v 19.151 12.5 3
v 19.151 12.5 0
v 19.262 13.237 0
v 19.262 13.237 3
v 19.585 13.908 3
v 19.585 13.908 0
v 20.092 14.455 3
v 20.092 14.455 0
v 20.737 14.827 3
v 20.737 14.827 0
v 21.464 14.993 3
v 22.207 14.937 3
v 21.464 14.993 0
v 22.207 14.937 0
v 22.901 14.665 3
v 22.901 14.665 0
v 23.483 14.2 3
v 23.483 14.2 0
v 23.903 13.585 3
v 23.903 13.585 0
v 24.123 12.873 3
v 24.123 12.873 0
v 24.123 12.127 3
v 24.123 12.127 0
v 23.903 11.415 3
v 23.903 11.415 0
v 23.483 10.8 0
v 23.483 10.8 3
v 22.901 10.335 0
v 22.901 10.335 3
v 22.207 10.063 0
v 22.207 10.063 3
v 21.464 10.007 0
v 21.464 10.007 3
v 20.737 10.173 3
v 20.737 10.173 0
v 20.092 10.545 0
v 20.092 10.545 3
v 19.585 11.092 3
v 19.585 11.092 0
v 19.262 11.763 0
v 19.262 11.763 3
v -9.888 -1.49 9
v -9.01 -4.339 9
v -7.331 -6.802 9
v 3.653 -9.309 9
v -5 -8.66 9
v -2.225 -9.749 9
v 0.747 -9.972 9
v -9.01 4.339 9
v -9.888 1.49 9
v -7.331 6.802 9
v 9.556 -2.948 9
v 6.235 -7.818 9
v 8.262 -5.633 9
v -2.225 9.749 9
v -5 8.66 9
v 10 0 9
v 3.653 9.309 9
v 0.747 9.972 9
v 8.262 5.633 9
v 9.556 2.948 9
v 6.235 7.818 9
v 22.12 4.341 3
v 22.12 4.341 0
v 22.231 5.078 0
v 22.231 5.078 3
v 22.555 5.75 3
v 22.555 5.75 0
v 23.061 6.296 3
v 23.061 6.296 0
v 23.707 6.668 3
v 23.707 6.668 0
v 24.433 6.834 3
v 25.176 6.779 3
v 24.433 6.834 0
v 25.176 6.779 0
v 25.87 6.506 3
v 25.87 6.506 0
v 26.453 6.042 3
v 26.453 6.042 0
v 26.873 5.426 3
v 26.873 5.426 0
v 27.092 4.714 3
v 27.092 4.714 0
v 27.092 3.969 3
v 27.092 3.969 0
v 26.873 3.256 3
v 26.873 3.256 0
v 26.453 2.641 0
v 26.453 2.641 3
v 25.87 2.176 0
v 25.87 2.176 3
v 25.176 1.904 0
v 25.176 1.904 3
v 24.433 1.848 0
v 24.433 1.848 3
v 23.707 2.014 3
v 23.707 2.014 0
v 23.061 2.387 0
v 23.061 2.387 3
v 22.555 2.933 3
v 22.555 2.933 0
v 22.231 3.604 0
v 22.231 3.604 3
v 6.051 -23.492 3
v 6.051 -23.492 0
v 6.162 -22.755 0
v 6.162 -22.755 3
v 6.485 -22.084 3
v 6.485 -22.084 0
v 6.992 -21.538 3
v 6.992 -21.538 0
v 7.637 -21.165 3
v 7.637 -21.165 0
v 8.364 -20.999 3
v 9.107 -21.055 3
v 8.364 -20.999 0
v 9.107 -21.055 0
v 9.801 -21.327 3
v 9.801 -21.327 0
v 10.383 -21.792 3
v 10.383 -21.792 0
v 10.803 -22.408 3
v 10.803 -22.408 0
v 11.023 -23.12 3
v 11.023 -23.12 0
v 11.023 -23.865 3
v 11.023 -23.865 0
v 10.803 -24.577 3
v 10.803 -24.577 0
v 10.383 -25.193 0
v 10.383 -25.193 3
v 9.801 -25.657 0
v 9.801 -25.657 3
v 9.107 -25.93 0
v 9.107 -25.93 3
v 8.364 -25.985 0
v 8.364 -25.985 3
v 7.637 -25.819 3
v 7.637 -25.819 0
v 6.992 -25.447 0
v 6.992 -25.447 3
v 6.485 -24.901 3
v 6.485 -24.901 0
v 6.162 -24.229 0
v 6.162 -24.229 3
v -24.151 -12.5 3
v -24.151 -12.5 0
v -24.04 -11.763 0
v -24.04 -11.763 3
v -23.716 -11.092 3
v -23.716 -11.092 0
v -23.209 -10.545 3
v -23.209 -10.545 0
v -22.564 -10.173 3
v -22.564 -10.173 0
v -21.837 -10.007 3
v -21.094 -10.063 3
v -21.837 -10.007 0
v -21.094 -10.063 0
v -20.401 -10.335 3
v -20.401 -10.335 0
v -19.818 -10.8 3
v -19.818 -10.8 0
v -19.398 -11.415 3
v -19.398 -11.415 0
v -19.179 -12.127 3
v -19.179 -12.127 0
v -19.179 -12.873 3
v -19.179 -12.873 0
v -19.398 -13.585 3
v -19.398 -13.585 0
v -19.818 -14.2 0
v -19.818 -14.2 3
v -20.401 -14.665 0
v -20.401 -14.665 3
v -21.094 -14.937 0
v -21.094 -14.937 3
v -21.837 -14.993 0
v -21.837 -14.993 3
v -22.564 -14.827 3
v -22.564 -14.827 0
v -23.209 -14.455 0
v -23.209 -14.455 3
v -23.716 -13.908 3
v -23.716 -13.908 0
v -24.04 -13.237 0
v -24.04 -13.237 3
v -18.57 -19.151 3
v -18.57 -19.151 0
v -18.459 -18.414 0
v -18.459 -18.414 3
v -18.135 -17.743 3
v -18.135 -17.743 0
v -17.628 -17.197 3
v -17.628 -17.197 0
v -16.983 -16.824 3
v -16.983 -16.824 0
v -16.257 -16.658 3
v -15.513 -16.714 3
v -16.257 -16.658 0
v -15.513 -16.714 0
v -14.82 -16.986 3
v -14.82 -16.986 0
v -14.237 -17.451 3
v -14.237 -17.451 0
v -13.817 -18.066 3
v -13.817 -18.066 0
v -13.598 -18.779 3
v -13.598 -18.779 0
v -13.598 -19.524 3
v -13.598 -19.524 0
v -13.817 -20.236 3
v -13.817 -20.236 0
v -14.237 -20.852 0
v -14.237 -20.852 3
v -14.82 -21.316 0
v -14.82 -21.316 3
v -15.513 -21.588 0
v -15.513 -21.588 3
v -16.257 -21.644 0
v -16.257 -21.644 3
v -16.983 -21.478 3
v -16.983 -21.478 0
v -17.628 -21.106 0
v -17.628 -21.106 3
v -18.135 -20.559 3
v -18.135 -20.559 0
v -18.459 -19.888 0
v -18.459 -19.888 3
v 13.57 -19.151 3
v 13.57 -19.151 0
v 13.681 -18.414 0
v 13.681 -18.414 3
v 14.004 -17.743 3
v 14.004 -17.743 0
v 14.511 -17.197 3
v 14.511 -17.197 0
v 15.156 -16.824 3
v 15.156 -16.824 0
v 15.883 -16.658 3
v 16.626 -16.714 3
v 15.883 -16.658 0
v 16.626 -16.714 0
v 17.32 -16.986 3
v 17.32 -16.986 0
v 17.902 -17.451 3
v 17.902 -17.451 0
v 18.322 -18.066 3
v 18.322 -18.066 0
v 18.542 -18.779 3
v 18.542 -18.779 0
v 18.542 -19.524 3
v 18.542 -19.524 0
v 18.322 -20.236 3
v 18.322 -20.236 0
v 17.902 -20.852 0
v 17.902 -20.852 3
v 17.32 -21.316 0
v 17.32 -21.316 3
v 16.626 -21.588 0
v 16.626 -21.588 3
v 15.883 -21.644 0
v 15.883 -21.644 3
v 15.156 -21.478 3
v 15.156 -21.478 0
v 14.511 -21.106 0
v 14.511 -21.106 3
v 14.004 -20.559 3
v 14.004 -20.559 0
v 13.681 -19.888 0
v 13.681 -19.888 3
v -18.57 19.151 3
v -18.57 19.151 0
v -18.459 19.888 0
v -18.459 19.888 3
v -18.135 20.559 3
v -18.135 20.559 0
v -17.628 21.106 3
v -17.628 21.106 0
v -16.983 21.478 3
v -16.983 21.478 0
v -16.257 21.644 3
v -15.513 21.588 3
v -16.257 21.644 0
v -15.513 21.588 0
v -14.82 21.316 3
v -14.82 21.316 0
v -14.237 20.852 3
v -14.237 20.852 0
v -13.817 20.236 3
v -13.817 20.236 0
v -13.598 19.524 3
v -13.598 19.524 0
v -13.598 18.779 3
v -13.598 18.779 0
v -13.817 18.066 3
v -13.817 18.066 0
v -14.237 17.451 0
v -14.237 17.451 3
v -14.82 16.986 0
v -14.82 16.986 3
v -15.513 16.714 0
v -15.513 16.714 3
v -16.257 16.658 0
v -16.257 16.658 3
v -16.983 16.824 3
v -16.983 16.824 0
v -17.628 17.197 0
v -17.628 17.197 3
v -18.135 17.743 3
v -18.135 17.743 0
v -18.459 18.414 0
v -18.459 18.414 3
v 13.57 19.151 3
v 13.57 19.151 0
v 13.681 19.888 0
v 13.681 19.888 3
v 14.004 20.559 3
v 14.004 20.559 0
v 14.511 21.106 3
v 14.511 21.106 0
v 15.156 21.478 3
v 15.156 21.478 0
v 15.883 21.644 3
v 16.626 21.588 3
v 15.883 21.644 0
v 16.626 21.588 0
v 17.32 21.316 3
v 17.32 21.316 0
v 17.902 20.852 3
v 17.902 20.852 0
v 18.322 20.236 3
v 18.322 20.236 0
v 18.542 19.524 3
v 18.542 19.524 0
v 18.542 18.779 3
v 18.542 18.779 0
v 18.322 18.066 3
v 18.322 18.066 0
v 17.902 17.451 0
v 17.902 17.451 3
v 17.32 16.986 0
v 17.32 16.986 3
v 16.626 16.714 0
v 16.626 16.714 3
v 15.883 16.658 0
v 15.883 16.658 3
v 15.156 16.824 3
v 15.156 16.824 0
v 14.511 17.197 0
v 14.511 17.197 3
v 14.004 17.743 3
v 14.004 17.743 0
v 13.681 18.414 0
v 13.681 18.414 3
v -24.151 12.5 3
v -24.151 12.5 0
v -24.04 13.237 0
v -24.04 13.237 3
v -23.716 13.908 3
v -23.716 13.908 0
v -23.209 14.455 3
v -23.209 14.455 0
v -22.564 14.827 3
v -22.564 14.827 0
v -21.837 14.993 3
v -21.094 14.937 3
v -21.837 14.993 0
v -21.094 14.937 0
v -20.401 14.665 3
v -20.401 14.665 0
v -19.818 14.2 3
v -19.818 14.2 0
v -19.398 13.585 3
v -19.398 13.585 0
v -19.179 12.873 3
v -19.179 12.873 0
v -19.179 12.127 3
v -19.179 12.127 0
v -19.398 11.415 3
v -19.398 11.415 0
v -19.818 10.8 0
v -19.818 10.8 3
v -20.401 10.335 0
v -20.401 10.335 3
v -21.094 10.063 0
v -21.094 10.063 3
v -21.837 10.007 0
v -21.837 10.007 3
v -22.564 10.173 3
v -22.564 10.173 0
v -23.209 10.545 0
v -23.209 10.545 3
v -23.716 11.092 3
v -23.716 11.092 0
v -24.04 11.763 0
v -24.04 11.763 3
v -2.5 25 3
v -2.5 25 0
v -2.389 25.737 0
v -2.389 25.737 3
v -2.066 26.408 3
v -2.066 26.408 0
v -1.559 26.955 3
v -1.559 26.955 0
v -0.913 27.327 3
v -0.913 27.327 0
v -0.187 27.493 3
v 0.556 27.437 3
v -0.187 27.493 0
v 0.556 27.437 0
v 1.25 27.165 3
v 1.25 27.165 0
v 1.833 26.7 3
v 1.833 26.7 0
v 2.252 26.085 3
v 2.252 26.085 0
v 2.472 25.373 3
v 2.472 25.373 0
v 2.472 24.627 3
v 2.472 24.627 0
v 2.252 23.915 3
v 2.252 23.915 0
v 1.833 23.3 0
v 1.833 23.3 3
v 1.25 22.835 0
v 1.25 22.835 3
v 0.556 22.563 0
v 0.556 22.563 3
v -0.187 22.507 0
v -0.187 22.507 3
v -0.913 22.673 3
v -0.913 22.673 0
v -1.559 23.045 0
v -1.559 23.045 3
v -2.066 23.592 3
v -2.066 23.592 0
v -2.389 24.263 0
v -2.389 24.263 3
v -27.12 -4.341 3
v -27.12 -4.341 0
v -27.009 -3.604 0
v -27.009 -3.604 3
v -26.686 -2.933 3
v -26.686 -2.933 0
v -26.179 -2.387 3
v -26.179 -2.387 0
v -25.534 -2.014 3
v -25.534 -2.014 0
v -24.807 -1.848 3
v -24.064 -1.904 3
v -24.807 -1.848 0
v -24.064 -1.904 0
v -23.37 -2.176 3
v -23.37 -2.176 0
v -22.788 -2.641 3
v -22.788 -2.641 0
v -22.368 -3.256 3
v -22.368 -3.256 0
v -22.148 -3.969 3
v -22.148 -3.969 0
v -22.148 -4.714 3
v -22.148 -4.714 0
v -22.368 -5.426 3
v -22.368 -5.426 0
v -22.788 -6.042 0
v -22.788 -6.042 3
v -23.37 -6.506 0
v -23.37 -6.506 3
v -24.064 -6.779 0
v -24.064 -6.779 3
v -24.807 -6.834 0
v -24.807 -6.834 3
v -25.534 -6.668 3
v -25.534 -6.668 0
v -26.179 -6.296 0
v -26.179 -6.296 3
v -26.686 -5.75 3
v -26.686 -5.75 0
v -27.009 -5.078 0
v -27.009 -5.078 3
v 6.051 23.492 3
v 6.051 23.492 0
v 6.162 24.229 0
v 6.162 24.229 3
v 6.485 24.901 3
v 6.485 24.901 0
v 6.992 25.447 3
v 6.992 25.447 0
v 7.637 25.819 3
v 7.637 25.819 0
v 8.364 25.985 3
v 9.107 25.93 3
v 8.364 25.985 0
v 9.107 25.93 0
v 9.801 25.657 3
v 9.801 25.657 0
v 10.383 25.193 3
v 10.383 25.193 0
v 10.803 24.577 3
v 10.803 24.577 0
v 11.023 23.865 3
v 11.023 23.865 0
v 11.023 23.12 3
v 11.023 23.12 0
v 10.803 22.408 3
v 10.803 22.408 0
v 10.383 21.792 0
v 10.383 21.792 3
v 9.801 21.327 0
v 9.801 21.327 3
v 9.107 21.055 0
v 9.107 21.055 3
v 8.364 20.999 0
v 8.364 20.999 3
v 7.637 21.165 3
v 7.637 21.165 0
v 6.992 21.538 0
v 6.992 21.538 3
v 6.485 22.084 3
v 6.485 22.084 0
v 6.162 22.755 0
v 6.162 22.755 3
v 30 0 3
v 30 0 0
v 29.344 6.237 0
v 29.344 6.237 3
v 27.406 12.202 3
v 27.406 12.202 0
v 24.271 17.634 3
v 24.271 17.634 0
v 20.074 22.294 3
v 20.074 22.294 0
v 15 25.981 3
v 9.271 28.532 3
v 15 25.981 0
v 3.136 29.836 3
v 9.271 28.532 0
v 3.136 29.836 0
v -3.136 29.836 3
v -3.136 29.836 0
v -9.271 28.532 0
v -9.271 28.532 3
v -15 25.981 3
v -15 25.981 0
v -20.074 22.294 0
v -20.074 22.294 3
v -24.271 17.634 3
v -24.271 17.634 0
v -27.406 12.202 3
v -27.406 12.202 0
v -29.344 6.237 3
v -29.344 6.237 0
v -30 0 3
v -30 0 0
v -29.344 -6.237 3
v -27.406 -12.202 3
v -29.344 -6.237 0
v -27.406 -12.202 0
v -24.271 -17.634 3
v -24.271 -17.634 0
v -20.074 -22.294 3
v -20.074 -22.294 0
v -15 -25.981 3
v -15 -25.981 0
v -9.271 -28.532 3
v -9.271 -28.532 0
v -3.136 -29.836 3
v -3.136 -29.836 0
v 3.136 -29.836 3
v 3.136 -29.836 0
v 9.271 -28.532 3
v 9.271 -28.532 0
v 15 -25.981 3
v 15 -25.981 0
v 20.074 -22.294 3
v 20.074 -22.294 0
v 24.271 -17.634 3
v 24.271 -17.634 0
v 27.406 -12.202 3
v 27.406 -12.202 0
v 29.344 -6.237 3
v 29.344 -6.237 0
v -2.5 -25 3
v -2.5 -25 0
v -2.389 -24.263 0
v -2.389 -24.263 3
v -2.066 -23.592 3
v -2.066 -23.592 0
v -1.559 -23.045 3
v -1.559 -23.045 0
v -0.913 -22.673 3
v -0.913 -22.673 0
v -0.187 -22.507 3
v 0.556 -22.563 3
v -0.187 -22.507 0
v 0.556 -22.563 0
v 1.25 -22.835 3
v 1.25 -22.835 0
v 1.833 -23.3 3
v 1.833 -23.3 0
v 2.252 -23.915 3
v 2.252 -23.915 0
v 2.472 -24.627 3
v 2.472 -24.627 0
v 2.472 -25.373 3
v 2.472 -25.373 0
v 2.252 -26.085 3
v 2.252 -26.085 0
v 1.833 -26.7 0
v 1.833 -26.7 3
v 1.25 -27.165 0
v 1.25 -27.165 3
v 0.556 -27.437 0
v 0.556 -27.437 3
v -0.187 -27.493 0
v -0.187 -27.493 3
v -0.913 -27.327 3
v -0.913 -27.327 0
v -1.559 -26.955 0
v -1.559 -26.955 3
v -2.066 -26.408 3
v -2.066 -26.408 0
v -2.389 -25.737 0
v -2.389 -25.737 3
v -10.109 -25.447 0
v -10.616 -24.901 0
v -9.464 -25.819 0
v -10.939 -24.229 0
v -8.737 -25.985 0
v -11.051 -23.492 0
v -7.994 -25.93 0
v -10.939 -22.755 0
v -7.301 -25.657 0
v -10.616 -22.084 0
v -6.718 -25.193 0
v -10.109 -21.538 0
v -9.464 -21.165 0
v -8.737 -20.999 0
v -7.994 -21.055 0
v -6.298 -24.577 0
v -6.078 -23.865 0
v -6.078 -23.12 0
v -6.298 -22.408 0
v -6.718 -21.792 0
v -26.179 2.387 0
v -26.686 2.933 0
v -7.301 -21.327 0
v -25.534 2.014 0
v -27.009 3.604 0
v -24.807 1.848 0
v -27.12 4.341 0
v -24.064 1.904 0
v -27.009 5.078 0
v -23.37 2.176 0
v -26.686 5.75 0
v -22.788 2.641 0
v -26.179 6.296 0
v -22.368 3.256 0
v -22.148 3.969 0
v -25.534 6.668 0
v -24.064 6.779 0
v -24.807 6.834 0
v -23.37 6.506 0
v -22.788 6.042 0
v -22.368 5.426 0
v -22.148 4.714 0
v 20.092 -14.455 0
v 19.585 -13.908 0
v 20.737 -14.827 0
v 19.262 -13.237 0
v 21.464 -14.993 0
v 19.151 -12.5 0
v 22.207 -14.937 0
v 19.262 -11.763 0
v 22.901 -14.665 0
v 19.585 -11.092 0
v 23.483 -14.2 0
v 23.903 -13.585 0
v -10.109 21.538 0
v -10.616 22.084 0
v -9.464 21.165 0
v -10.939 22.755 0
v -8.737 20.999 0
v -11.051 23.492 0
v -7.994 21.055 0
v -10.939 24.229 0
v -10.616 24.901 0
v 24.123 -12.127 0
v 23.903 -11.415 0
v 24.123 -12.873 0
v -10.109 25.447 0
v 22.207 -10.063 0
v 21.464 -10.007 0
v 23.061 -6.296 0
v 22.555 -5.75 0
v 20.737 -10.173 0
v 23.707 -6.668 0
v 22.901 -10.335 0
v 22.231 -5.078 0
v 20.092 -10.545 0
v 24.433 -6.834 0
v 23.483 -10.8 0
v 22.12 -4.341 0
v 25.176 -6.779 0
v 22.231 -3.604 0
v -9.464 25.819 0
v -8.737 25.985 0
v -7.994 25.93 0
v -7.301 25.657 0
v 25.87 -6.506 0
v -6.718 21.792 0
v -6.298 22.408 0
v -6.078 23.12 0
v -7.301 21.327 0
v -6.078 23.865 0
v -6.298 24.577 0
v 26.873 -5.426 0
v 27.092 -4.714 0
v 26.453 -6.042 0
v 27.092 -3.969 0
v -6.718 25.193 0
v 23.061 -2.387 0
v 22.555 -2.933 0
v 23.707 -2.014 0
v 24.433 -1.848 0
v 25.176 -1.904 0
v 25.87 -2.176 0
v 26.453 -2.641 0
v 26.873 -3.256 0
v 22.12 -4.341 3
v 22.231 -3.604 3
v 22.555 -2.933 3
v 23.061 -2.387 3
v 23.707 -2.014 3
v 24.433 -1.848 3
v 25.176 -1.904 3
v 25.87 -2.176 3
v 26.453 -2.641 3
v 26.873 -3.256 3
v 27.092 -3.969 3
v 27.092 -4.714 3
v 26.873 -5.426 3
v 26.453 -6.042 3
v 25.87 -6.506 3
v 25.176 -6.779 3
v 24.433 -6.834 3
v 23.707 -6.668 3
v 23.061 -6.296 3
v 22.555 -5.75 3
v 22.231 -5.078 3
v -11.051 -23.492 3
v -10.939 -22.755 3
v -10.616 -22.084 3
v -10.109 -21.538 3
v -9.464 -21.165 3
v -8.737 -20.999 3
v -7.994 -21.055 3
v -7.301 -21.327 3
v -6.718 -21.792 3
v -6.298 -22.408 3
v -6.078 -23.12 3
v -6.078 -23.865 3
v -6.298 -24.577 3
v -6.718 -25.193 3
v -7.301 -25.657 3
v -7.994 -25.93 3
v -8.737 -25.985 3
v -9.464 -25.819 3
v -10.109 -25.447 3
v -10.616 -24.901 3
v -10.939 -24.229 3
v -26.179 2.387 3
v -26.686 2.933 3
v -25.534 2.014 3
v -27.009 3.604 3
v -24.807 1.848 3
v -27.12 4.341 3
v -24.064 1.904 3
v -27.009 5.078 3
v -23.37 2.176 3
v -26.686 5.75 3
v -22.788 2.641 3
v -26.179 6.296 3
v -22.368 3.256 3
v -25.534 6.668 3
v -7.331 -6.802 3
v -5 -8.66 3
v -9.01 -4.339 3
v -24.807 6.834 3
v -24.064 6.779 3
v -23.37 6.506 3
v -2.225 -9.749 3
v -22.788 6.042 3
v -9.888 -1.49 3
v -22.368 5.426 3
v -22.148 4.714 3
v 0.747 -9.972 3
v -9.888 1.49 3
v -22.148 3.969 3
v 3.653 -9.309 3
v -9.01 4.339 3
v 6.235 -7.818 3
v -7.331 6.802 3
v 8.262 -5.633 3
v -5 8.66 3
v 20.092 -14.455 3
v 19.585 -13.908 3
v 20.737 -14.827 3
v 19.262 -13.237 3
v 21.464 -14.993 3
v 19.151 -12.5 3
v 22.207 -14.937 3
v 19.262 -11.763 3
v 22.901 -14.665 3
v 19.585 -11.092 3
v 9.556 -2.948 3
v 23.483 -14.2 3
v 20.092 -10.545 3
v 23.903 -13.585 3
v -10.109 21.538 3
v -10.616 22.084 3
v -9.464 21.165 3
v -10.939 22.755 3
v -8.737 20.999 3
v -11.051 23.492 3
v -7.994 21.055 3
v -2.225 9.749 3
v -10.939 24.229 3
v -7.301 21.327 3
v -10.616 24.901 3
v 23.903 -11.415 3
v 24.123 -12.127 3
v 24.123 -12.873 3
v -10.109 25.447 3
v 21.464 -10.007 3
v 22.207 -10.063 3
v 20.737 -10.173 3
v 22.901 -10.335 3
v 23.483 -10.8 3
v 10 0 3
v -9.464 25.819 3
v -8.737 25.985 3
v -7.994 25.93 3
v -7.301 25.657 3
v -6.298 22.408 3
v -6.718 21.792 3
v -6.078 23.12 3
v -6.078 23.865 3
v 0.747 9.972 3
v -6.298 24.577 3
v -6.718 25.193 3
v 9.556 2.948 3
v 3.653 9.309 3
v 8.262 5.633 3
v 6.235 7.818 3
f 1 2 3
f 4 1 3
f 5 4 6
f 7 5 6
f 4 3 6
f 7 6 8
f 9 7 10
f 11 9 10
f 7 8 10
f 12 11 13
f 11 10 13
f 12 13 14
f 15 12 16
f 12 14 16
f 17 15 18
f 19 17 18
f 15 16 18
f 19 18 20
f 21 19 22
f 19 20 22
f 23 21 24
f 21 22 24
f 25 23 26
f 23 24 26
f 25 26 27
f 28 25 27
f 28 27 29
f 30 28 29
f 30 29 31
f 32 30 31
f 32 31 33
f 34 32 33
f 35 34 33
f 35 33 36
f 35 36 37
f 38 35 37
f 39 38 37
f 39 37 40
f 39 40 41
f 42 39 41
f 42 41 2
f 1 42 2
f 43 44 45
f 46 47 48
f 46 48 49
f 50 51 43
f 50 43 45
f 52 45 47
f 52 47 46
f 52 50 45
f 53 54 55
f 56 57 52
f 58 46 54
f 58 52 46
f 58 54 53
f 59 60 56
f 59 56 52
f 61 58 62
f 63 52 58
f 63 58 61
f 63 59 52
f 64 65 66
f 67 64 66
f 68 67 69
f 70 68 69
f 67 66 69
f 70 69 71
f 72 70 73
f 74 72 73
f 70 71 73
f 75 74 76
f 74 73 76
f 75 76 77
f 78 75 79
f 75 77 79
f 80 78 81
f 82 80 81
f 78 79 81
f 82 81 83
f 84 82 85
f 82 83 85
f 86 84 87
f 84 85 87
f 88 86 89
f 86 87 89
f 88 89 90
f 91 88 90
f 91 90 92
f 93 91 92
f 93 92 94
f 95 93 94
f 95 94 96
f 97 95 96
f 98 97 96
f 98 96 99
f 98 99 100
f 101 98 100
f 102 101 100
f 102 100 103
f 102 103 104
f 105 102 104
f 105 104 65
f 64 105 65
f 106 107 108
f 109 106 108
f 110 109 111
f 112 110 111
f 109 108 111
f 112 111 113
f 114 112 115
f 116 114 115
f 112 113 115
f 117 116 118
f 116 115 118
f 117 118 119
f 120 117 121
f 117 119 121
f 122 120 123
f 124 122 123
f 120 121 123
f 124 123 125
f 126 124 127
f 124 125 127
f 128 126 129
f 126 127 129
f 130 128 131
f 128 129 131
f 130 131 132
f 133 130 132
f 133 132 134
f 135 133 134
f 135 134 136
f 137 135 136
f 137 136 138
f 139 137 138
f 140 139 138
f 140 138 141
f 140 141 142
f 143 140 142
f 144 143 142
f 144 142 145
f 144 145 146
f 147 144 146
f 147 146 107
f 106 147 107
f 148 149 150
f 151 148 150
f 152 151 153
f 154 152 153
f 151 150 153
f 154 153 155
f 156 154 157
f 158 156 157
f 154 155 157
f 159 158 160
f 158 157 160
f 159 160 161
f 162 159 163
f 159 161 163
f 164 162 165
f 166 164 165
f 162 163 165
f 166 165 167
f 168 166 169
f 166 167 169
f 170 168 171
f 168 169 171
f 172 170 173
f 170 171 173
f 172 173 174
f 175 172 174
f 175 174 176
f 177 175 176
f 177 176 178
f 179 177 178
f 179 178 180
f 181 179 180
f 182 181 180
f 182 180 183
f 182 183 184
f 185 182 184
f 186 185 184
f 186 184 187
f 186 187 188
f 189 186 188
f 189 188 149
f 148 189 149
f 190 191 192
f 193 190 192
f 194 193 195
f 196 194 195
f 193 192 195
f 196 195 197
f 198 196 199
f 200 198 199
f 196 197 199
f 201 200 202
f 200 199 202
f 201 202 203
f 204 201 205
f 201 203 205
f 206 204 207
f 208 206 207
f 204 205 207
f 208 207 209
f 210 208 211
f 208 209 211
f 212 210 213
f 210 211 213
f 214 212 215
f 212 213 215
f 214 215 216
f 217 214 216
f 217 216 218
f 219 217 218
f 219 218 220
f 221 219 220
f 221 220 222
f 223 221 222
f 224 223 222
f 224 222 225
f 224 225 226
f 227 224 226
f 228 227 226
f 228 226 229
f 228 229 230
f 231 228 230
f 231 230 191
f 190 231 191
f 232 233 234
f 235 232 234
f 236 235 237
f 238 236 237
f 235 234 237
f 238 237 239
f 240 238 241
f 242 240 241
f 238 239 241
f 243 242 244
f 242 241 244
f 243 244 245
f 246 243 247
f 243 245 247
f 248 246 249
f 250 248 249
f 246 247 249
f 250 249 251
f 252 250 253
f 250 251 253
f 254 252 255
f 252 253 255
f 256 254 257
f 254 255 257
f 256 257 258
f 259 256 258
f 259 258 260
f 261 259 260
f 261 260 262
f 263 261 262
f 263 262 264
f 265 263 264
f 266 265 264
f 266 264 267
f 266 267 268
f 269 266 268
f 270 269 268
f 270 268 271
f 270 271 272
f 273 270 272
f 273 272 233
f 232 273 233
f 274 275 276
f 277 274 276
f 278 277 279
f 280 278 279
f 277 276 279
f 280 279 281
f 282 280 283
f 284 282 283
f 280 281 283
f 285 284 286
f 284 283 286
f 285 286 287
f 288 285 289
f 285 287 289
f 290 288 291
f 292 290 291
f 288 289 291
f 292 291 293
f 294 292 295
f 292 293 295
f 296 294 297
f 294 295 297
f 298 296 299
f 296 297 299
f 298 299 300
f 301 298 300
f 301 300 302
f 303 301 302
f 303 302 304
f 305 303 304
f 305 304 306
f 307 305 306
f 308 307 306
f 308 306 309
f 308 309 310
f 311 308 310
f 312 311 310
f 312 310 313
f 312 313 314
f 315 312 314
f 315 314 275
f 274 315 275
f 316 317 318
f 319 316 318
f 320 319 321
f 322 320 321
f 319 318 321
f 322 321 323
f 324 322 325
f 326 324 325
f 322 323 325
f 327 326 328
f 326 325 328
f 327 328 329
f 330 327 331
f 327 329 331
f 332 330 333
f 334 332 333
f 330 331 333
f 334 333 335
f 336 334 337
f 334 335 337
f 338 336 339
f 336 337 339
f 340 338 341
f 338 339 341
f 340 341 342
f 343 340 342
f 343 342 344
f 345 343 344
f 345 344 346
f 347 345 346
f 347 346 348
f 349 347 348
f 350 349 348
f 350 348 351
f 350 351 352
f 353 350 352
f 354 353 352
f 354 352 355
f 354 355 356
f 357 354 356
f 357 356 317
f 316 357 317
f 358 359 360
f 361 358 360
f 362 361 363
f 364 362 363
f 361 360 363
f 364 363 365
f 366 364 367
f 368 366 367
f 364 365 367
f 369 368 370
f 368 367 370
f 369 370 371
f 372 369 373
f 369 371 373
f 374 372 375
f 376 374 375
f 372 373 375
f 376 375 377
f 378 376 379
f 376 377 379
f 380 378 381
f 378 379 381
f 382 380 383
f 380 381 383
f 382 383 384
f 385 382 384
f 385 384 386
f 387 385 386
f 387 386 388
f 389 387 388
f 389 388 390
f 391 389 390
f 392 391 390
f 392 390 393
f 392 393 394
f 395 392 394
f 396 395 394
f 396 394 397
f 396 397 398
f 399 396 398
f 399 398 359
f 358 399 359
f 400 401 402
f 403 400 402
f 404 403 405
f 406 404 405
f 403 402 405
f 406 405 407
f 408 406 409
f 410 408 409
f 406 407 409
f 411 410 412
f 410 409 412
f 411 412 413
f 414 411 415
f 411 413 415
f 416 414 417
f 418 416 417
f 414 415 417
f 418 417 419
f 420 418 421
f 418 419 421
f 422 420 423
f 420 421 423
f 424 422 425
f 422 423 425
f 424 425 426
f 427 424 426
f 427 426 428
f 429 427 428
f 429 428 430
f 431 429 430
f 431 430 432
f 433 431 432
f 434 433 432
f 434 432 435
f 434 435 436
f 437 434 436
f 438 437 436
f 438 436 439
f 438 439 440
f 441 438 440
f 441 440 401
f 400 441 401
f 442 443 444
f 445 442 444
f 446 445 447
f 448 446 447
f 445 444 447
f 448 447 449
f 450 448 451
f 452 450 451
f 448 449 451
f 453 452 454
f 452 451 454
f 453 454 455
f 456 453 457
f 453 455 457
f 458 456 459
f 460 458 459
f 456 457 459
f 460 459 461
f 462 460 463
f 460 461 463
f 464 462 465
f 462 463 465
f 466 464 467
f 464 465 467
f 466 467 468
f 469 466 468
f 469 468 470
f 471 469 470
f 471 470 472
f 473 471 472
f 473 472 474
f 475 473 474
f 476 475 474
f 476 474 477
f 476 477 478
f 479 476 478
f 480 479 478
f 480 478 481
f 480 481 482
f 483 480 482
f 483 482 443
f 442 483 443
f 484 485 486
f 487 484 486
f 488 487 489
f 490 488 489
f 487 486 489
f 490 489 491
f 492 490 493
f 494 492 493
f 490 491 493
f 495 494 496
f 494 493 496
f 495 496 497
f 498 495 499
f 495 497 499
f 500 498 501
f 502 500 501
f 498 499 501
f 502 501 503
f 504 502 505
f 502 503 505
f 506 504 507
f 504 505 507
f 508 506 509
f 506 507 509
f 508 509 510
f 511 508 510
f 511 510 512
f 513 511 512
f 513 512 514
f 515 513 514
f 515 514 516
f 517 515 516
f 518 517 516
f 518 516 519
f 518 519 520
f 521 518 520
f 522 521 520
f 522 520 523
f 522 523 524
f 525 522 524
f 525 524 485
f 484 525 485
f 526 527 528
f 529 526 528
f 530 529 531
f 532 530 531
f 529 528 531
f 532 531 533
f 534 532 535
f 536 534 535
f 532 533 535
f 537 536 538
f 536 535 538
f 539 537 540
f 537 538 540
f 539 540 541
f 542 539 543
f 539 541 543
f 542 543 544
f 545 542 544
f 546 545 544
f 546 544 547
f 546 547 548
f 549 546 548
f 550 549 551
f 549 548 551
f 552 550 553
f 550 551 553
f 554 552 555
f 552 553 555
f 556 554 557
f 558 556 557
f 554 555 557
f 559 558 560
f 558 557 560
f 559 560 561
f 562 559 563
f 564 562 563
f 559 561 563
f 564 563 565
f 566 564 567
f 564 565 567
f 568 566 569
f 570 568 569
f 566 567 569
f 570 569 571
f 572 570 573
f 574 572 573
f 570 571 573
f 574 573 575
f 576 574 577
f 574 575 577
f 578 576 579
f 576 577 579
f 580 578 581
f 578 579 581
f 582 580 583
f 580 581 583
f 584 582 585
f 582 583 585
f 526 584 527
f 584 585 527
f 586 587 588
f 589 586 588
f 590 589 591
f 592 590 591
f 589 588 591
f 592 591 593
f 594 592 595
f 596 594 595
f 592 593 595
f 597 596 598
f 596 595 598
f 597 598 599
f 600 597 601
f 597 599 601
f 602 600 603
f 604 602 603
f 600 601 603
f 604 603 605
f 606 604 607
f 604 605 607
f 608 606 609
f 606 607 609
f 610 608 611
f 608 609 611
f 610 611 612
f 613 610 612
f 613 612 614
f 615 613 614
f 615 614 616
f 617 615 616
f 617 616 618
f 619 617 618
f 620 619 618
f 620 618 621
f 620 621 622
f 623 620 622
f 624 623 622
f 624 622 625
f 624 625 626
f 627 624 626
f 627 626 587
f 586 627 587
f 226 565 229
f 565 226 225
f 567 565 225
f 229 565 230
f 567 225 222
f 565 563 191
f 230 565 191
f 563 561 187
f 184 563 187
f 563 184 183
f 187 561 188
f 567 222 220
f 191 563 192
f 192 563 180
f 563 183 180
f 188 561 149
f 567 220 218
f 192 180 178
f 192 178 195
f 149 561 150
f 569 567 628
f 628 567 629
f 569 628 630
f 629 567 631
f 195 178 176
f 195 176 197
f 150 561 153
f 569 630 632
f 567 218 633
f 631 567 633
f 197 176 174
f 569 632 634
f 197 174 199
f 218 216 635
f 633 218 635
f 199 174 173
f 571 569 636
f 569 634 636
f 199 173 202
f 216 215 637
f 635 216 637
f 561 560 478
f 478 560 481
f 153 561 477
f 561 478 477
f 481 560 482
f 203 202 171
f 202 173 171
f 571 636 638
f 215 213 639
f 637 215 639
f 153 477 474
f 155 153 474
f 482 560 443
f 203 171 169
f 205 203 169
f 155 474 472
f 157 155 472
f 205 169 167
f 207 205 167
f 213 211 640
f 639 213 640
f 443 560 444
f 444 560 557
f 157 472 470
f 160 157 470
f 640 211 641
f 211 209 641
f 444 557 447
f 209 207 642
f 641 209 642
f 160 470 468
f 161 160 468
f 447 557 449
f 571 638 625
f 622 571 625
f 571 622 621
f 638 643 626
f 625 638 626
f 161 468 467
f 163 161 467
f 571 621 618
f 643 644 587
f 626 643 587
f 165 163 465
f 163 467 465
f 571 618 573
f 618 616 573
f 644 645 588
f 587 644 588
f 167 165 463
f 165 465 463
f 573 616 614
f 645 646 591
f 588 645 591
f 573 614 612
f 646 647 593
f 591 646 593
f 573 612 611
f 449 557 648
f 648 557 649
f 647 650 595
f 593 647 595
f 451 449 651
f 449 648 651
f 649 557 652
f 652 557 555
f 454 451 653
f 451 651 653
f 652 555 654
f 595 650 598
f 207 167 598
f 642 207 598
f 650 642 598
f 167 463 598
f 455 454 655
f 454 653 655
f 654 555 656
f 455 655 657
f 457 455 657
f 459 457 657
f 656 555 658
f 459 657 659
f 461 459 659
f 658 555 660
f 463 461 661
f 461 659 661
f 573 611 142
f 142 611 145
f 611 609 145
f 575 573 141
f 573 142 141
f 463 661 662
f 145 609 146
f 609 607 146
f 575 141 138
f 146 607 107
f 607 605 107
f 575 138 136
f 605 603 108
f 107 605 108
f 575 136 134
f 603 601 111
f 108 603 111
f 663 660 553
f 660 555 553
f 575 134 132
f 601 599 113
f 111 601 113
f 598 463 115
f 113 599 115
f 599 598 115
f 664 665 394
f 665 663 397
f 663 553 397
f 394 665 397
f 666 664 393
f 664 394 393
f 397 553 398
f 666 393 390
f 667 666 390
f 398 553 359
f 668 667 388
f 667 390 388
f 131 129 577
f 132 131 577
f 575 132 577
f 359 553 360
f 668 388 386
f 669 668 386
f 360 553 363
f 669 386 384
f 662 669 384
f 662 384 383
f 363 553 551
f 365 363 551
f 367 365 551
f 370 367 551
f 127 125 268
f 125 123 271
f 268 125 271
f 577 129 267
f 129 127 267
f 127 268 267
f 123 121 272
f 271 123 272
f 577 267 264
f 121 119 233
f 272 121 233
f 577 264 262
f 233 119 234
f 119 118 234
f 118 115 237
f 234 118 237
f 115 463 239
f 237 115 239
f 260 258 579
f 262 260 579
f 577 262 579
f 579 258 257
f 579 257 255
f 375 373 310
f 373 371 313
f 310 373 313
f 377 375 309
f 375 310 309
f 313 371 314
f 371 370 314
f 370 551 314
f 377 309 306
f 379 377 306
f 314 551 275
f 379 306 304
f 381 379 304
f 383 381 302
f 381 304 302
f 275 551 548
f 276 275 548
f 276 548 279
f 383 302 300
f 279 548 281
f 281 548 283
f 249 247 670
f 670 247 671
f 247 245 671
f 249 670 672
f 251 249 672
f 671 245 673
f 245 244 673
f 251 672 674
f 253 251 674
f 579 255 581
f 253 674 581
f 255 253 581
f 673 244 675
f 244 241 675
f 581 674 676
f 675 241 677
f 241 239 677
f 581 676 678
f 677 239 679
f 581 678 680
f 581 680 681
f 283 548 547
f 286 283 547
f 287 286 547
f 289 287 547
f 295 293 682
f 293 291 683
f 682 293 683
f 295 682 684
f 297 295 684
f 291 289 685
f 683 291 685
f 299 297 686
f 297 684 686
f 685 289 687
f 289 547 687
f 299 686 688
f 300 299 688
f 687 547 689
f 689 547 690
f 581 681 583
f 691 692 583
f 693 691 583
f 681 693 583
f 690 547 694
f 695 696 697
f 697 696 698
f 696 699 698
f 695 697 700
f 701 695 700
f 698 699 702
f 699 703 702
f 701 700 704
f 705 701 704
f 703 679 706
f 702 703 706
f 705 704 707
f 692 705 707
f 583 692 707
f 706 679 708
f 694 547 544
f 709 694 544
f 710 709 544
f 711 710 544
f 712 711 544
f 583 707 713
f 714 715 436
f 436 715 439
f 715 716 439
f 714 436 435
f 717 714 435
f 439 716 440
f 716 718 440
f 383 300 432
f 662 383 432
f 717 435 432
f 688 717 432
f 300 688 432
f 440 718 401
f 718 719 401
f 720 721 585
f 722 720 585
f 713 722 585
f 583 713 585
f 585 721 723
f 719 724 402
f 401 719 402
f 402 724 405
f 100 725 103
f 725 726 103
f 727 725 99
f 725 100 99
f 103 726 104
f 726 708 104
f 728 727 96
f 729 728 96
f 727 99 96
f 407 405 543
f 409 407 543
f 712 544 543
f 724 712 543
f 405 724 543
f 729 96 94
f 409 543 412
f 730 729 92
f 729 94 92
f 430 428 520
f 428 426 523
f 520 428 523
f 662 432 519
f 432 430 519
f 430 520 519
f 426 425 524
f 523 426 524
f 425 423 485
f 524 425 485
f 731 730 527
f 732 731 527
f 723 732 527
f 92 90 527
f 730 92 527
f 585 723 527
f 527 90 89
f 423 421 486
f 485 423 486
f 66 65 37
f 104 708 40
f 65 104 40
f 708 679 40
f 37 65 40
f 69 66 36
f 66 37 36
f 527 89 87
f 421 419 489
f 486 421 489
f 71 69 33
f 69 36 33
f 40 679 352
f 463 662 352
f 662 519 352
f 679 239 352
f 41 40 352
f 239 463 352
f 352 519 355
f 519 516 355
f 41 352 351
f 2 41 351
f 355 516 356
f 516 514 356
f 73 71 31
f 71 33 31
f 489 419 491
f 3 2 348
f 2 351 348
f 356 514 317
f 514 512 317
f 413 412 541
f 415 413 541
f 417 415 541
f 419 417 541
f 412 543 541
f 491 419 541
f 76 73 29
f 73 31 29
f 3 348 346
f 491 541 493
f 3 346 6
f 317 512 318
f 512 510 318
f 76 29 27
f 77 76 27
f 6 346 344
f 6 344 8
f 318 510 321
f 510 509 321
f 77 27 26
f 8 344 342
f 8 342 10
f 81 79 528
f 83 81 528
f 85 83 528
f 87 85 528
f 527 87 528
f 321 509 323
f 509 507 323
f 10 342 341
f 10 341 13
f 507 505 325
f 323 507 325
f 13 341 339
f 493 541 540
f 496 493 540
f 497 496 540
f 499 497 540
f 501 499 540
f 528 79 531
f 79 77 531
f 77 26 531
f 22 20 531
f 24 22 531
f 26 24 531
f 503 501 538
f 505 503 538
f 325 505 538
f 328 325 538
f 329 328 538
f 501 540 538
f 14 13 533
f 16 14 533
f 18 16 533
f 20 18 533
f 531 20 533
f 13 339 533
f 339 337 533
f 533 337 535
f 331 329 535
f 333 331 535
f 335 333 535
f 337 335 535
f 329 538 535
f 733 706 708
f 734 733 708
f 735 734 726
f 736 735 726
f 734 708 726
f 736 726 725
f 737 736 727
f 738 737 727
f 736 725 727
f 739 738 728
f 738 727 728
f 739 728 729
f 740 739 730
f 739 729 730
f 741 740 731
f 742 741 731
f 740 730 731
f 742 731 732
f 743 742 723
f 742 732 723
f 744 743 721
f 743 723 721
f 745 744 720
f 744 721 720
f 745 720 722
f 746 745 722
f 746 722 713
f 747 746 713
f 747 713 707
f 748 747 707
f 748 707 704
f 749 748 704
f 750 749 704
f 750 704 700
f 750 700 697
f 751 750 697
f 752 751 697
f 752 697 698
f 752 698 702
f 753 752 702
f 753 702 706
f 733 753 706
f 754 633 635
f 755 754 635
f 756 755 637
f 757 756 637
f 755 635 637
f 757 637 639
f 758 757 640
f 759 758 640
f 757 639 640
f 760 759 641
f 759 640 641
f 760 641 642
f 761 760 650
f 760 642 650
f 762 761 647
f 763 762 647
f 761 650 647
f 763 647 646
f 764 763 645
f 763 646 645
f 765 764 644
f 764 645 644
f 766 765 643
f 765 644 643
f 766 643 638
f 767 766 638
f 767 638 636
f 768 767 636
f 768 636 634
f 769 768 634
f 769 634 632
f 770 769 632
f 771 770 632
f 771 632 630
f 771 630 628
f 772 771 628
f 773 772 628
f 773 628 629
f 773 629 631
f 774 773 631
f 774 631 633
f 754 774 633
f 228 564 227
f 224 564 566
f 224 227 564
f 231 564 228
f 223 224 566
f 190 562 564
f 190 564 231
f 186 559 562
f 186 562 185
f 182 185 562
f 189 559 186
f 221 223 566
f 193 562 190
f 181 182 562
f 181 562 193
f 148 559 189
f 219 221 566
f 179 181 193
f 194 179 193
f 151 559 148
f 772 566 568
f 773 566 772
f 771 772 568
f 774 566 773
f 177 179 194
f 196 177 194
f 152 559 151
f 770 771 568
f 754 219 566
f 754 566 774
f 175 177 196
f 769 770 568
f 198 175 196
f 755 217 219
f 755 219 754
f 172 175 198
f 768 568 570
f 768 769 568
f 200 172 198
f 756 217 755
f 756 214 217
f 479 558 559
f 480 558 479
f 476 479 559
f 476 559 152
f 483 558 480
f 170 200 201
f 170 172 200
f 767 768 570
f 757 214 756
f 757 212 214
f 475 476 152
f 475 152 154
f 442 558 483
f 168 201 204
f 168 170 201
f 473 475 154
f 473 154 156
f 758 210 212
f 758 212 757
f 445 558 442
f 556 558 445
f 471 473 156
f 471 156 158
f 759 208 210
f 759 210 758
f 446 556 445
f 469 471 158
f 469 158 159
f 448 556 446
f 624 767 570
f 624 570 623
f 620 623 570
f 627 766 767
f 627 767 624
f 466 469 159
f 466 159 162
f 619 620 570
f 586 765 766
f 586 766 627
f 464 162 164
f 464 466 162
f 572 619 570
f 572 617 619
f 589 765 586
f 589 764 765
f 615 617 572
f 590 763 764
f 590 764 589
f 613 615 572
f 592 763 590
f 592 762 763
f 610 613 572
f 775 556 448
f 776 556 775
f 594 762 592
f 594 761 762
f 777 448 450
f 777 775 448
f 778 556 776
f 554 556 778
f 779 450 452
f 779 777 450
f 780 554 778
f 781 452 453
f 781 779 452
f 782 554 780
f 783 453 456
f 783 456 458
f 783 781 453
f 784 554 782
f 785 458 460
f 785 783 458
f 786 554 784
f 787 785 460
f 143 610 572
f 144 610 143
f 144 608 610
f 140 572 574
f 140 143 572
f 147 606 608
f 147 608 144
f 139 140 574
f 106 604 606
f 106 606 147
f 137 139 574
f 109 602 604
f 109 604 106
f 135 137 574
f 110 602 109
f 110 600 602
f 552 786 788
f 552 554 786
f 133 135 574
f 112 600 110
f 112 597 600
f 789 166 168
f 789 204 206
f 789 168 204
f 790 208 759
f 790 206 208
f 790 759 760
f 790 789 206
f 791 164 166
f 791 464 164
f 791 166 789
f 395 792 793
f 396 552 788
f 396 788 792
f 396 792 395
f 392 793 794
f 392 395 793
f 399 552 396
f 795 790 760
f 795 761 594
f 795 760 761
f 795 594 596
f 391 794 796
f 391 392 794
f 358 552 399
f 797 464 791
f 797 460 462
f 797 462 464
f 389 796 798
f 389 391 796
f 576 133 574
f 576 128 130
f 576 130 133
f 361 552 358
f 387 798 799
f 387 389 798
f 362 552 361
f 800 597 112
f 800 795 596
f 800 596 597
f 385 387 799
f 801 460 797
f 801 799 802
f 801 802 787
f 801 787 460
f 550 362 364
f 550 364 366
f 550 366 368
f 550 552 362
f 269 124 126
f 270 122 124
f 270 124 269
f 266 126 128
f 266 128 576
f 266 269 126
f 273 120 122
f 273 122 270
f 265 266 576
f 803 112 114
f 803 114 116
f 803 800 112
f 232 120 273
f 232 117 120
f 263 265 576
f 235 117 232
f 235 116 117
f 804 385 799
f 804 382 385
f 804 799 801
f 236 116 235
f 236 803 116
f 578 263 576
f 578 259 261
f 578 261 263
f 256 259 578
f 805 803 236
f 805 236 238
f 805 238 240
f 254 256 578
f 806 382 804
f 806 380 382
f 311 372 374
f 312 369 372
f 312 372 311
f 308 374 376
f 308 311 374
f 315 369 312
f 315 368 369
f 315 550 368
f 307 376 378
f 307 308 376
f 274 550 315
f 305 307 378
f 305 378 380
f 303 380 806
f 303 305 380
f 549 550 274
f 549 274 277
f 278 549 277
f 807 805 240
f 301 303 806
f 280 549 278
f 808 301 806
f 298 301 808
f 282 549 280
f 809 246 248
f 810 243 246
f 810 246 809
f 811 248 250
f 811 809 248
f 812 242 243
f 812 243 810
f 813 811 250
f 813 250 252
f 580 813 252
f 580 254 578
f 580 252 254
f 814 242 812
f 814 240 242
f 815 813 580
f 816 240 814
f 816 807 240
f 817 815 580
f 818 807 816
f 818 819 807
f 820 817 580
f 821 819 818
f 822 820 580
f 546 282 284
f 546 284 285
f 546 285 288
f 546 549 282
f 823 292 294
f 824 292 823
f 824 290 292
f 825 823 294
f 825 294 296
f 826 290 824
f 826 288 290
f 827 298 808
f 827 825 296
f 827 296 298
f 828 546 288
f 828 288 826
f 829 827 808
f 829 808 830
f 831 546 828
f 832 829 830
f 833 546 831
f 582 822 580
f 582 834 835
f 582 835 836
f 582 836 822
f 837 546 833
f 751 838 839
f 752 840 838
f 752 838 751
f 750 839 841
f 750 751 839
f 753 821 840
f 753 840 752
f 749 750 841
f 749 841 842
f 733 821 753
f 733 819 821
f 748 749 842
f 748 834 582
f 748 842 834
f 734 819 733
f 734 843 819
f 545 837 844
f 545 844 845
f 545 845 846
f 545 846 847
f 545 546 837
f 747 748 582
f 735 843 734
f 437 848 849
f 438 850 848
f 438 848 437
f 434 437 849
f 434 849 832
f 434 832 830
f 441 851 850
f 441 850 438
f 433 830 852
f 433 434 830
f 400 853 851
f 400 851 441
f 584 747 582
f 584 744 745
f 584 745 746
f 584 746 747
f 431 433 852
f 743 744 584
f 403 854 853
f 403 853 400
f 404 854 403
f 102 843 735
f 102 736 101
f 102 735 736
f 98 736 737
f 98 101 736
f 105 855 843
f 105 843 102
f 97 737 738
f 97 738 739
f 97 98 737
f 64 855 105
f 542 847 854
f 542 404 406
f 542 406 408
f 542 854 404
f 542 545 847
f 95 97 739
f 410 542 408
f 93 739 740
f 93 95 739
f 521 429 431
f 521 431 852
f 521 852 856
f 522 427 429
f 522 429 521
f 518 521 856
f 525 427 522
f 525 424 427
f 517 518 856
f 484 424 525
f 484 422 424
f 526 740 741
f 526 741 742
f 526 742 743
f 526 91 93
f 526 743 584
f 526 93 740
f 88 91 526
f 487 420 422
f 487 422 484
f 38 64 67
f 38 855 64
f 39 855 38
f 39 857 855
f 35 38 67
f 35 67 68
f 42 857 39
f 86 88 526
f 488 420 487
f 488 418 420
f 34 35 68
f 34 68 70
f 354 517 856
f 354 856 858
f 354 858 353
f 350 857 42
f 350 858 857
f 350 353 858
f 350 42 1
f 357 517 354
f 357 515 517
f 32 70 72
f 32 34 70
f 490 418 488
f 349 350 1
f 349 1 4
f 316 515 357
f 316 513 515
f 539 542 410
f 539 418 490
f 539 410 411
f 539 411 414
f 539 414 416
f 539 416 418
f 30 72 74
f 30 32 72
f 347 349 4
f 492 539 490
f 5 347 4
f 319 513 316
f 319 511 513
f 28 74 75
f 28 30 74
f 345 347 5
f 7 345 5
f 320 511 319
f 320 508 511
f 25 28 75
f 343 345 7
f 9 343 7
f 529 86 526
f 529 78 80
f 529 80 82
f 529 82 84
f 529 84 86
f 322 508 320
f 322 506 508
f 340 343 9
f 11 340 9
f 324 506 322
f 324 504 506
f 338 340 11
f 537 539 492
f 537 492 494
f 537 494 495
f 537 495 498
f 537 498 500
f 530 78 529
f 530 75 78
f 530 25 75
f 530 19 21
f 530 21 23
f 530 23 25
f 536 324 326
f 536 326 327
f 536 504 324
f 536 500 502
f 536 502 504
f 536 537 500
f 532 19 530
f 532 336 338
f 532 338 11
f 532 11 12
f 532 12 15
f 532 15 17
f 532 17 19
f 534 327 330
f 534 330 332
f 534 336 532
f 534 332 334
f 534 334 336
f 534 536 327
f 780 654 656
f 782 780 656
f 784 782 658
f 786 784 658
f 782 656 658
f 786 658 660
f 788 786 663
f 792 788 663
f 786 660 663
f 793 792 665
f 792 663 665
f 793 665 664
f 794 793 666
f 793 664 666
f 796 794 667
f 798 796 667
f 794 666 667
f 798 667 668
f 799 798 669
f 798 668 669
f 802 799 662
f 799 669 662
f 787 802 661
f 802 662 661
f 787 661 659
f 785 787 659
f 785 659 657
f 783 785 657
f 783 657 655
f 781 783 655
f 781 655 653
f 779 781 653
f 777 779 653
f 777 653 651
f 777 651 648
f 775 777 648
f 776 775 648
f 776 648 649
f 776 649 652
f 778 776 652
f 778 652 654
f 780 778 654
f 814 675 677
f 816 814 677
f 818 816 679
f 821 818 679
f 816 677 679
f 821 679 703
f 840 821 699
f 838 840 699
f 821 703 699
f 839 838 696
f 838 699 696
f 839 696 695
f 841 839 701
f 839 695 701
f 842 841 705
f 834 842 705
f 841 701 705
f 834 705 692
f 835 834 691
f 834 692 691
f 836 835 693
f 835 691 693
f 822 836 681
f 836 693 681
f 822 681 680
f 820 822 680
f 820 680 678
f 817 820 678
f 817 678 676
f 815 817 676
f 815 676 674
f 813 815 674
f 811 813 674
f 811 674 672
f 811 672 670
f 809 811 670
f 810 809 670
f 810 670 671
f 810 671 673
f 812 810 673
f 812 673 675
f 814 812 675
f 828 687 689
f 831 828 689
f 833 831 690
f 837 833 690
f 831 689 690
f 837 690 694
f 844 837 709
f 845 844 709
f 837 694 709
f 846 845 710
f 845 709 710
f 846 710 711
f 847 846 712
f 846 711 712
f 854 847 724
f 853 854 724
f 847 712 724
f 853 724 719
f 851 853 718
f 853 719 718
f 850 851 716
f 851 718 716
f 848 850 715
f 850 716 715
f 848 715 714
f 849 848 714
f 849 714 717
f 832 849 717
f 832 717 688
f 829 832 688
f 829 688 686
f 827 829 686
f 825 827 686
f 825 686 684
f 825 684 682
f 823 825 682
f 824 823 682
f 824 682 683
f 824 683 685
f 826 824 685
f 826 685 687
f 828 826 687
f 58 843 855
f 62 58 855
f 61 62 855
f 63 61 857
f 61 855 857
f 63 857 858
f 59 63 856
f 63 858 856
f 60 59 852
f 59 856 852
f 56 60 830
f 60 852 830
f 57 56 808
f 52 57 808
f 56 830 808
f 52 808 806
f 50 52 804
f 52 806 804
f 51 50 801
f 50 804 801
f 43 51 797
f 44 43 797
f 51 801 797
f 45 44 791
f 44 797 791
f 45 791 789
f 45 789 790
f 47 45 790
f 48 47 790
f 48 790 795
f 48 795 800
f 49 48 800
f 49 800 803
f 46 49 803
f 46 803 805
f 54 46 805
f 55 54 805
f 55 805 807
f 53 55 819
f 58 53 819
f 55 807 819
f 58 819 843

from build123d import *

# Parameters (mm, degrees)
SKETCH1_R           = 30
BOSS_EXTRUDE1_DEPTH = 3
SKETCH2_R           = 10
BOSS_EXTRUDE2_DEPTH = 6
SKETCH3_R           = 2.5
CUT_EXTRUDE1_DEPTH  = 44.370496884


with BuildPart() as part:
    # Sketch1 → Boss-Extrude1 (new body)
    with BuildSketch(Plane.XY):
        Circle(SKETCH1_R)
    extrude(amount=BOSS_EXTRUDE1_DEPTH)

    # Sketch2 → Boss-Extrude2 (add)
    with BuildSketch(Plane.XY.offset(3)):
        Circle(SKETCH2_R)
    extrude(amount=BOSS_EXTRUDE2_DEPTH)

    # Sketch3 → Cut-Extrude1 (cut, through all)
    with BuildSketch(Plane(origin=(0, 0, 0), x_dir=(-1, 0, 0), z_dir=(0, 0, -1))):
        with Locations((0, 25)):
            Circle(SKETCH3_R)
        with Locations((8.550503583, 23.49231552)):
            Circle(SKETCH3_R)
        with Locations((16.069690242, 19.151111078)):
            Circle(SKETCH3_R)
        with Locations((21.650635095, 12.5)):
            Circle(SKETCH3_R)
        with Locations((24.620193825, 4.341204442)):
            Circle(SKETCH3_R)
        with Locations((24.620193825, -4.341204442)):
            Circle(SKETCH3_R)
        with Locations((21.650635095, -12.5)):
            Circle(SKETCH3_R)
        with Locations((16.069690242, -19.151111078)):
            Circle(SKETCH3_R)
        with Locations((8.550503583, -23.49231552)):
            Circle(SKETCH3_R)
        with Locations((0, -25)):
            Circle(SKETCH3_R)
        with Locations((-8.550503583, -23.49231552)):
            Circle(SKETCH3_R)
        with Locations((-16.069690242, -19.151111078)):
            Circle(SKETCH3_R)
        with Locations((-21.650635095, -12.5)):
            Circle(SKETCH3_R)
        with Locations((-24.620193825, -4.341204442)):
            Circle(SKETCH3_R)
        with Locations((-24.620193825, 4.341204442)):
            Circle(SKETCH3_R)
        with Locations((-21.650635095, 12.5)):
            Circle(SKETCH3_R)
        with Locations((-16.069690242, 19.151111078)):
            Circle(SKETCH3_R)
        with Locations((-8.550503583, 23.49231552)):
            Circle(SKETCH3_R)
    extrude(amount=-CUT_EXTRUDE1_DEPTH, mode=Mode.SUBTRACT)


solid = part.part
